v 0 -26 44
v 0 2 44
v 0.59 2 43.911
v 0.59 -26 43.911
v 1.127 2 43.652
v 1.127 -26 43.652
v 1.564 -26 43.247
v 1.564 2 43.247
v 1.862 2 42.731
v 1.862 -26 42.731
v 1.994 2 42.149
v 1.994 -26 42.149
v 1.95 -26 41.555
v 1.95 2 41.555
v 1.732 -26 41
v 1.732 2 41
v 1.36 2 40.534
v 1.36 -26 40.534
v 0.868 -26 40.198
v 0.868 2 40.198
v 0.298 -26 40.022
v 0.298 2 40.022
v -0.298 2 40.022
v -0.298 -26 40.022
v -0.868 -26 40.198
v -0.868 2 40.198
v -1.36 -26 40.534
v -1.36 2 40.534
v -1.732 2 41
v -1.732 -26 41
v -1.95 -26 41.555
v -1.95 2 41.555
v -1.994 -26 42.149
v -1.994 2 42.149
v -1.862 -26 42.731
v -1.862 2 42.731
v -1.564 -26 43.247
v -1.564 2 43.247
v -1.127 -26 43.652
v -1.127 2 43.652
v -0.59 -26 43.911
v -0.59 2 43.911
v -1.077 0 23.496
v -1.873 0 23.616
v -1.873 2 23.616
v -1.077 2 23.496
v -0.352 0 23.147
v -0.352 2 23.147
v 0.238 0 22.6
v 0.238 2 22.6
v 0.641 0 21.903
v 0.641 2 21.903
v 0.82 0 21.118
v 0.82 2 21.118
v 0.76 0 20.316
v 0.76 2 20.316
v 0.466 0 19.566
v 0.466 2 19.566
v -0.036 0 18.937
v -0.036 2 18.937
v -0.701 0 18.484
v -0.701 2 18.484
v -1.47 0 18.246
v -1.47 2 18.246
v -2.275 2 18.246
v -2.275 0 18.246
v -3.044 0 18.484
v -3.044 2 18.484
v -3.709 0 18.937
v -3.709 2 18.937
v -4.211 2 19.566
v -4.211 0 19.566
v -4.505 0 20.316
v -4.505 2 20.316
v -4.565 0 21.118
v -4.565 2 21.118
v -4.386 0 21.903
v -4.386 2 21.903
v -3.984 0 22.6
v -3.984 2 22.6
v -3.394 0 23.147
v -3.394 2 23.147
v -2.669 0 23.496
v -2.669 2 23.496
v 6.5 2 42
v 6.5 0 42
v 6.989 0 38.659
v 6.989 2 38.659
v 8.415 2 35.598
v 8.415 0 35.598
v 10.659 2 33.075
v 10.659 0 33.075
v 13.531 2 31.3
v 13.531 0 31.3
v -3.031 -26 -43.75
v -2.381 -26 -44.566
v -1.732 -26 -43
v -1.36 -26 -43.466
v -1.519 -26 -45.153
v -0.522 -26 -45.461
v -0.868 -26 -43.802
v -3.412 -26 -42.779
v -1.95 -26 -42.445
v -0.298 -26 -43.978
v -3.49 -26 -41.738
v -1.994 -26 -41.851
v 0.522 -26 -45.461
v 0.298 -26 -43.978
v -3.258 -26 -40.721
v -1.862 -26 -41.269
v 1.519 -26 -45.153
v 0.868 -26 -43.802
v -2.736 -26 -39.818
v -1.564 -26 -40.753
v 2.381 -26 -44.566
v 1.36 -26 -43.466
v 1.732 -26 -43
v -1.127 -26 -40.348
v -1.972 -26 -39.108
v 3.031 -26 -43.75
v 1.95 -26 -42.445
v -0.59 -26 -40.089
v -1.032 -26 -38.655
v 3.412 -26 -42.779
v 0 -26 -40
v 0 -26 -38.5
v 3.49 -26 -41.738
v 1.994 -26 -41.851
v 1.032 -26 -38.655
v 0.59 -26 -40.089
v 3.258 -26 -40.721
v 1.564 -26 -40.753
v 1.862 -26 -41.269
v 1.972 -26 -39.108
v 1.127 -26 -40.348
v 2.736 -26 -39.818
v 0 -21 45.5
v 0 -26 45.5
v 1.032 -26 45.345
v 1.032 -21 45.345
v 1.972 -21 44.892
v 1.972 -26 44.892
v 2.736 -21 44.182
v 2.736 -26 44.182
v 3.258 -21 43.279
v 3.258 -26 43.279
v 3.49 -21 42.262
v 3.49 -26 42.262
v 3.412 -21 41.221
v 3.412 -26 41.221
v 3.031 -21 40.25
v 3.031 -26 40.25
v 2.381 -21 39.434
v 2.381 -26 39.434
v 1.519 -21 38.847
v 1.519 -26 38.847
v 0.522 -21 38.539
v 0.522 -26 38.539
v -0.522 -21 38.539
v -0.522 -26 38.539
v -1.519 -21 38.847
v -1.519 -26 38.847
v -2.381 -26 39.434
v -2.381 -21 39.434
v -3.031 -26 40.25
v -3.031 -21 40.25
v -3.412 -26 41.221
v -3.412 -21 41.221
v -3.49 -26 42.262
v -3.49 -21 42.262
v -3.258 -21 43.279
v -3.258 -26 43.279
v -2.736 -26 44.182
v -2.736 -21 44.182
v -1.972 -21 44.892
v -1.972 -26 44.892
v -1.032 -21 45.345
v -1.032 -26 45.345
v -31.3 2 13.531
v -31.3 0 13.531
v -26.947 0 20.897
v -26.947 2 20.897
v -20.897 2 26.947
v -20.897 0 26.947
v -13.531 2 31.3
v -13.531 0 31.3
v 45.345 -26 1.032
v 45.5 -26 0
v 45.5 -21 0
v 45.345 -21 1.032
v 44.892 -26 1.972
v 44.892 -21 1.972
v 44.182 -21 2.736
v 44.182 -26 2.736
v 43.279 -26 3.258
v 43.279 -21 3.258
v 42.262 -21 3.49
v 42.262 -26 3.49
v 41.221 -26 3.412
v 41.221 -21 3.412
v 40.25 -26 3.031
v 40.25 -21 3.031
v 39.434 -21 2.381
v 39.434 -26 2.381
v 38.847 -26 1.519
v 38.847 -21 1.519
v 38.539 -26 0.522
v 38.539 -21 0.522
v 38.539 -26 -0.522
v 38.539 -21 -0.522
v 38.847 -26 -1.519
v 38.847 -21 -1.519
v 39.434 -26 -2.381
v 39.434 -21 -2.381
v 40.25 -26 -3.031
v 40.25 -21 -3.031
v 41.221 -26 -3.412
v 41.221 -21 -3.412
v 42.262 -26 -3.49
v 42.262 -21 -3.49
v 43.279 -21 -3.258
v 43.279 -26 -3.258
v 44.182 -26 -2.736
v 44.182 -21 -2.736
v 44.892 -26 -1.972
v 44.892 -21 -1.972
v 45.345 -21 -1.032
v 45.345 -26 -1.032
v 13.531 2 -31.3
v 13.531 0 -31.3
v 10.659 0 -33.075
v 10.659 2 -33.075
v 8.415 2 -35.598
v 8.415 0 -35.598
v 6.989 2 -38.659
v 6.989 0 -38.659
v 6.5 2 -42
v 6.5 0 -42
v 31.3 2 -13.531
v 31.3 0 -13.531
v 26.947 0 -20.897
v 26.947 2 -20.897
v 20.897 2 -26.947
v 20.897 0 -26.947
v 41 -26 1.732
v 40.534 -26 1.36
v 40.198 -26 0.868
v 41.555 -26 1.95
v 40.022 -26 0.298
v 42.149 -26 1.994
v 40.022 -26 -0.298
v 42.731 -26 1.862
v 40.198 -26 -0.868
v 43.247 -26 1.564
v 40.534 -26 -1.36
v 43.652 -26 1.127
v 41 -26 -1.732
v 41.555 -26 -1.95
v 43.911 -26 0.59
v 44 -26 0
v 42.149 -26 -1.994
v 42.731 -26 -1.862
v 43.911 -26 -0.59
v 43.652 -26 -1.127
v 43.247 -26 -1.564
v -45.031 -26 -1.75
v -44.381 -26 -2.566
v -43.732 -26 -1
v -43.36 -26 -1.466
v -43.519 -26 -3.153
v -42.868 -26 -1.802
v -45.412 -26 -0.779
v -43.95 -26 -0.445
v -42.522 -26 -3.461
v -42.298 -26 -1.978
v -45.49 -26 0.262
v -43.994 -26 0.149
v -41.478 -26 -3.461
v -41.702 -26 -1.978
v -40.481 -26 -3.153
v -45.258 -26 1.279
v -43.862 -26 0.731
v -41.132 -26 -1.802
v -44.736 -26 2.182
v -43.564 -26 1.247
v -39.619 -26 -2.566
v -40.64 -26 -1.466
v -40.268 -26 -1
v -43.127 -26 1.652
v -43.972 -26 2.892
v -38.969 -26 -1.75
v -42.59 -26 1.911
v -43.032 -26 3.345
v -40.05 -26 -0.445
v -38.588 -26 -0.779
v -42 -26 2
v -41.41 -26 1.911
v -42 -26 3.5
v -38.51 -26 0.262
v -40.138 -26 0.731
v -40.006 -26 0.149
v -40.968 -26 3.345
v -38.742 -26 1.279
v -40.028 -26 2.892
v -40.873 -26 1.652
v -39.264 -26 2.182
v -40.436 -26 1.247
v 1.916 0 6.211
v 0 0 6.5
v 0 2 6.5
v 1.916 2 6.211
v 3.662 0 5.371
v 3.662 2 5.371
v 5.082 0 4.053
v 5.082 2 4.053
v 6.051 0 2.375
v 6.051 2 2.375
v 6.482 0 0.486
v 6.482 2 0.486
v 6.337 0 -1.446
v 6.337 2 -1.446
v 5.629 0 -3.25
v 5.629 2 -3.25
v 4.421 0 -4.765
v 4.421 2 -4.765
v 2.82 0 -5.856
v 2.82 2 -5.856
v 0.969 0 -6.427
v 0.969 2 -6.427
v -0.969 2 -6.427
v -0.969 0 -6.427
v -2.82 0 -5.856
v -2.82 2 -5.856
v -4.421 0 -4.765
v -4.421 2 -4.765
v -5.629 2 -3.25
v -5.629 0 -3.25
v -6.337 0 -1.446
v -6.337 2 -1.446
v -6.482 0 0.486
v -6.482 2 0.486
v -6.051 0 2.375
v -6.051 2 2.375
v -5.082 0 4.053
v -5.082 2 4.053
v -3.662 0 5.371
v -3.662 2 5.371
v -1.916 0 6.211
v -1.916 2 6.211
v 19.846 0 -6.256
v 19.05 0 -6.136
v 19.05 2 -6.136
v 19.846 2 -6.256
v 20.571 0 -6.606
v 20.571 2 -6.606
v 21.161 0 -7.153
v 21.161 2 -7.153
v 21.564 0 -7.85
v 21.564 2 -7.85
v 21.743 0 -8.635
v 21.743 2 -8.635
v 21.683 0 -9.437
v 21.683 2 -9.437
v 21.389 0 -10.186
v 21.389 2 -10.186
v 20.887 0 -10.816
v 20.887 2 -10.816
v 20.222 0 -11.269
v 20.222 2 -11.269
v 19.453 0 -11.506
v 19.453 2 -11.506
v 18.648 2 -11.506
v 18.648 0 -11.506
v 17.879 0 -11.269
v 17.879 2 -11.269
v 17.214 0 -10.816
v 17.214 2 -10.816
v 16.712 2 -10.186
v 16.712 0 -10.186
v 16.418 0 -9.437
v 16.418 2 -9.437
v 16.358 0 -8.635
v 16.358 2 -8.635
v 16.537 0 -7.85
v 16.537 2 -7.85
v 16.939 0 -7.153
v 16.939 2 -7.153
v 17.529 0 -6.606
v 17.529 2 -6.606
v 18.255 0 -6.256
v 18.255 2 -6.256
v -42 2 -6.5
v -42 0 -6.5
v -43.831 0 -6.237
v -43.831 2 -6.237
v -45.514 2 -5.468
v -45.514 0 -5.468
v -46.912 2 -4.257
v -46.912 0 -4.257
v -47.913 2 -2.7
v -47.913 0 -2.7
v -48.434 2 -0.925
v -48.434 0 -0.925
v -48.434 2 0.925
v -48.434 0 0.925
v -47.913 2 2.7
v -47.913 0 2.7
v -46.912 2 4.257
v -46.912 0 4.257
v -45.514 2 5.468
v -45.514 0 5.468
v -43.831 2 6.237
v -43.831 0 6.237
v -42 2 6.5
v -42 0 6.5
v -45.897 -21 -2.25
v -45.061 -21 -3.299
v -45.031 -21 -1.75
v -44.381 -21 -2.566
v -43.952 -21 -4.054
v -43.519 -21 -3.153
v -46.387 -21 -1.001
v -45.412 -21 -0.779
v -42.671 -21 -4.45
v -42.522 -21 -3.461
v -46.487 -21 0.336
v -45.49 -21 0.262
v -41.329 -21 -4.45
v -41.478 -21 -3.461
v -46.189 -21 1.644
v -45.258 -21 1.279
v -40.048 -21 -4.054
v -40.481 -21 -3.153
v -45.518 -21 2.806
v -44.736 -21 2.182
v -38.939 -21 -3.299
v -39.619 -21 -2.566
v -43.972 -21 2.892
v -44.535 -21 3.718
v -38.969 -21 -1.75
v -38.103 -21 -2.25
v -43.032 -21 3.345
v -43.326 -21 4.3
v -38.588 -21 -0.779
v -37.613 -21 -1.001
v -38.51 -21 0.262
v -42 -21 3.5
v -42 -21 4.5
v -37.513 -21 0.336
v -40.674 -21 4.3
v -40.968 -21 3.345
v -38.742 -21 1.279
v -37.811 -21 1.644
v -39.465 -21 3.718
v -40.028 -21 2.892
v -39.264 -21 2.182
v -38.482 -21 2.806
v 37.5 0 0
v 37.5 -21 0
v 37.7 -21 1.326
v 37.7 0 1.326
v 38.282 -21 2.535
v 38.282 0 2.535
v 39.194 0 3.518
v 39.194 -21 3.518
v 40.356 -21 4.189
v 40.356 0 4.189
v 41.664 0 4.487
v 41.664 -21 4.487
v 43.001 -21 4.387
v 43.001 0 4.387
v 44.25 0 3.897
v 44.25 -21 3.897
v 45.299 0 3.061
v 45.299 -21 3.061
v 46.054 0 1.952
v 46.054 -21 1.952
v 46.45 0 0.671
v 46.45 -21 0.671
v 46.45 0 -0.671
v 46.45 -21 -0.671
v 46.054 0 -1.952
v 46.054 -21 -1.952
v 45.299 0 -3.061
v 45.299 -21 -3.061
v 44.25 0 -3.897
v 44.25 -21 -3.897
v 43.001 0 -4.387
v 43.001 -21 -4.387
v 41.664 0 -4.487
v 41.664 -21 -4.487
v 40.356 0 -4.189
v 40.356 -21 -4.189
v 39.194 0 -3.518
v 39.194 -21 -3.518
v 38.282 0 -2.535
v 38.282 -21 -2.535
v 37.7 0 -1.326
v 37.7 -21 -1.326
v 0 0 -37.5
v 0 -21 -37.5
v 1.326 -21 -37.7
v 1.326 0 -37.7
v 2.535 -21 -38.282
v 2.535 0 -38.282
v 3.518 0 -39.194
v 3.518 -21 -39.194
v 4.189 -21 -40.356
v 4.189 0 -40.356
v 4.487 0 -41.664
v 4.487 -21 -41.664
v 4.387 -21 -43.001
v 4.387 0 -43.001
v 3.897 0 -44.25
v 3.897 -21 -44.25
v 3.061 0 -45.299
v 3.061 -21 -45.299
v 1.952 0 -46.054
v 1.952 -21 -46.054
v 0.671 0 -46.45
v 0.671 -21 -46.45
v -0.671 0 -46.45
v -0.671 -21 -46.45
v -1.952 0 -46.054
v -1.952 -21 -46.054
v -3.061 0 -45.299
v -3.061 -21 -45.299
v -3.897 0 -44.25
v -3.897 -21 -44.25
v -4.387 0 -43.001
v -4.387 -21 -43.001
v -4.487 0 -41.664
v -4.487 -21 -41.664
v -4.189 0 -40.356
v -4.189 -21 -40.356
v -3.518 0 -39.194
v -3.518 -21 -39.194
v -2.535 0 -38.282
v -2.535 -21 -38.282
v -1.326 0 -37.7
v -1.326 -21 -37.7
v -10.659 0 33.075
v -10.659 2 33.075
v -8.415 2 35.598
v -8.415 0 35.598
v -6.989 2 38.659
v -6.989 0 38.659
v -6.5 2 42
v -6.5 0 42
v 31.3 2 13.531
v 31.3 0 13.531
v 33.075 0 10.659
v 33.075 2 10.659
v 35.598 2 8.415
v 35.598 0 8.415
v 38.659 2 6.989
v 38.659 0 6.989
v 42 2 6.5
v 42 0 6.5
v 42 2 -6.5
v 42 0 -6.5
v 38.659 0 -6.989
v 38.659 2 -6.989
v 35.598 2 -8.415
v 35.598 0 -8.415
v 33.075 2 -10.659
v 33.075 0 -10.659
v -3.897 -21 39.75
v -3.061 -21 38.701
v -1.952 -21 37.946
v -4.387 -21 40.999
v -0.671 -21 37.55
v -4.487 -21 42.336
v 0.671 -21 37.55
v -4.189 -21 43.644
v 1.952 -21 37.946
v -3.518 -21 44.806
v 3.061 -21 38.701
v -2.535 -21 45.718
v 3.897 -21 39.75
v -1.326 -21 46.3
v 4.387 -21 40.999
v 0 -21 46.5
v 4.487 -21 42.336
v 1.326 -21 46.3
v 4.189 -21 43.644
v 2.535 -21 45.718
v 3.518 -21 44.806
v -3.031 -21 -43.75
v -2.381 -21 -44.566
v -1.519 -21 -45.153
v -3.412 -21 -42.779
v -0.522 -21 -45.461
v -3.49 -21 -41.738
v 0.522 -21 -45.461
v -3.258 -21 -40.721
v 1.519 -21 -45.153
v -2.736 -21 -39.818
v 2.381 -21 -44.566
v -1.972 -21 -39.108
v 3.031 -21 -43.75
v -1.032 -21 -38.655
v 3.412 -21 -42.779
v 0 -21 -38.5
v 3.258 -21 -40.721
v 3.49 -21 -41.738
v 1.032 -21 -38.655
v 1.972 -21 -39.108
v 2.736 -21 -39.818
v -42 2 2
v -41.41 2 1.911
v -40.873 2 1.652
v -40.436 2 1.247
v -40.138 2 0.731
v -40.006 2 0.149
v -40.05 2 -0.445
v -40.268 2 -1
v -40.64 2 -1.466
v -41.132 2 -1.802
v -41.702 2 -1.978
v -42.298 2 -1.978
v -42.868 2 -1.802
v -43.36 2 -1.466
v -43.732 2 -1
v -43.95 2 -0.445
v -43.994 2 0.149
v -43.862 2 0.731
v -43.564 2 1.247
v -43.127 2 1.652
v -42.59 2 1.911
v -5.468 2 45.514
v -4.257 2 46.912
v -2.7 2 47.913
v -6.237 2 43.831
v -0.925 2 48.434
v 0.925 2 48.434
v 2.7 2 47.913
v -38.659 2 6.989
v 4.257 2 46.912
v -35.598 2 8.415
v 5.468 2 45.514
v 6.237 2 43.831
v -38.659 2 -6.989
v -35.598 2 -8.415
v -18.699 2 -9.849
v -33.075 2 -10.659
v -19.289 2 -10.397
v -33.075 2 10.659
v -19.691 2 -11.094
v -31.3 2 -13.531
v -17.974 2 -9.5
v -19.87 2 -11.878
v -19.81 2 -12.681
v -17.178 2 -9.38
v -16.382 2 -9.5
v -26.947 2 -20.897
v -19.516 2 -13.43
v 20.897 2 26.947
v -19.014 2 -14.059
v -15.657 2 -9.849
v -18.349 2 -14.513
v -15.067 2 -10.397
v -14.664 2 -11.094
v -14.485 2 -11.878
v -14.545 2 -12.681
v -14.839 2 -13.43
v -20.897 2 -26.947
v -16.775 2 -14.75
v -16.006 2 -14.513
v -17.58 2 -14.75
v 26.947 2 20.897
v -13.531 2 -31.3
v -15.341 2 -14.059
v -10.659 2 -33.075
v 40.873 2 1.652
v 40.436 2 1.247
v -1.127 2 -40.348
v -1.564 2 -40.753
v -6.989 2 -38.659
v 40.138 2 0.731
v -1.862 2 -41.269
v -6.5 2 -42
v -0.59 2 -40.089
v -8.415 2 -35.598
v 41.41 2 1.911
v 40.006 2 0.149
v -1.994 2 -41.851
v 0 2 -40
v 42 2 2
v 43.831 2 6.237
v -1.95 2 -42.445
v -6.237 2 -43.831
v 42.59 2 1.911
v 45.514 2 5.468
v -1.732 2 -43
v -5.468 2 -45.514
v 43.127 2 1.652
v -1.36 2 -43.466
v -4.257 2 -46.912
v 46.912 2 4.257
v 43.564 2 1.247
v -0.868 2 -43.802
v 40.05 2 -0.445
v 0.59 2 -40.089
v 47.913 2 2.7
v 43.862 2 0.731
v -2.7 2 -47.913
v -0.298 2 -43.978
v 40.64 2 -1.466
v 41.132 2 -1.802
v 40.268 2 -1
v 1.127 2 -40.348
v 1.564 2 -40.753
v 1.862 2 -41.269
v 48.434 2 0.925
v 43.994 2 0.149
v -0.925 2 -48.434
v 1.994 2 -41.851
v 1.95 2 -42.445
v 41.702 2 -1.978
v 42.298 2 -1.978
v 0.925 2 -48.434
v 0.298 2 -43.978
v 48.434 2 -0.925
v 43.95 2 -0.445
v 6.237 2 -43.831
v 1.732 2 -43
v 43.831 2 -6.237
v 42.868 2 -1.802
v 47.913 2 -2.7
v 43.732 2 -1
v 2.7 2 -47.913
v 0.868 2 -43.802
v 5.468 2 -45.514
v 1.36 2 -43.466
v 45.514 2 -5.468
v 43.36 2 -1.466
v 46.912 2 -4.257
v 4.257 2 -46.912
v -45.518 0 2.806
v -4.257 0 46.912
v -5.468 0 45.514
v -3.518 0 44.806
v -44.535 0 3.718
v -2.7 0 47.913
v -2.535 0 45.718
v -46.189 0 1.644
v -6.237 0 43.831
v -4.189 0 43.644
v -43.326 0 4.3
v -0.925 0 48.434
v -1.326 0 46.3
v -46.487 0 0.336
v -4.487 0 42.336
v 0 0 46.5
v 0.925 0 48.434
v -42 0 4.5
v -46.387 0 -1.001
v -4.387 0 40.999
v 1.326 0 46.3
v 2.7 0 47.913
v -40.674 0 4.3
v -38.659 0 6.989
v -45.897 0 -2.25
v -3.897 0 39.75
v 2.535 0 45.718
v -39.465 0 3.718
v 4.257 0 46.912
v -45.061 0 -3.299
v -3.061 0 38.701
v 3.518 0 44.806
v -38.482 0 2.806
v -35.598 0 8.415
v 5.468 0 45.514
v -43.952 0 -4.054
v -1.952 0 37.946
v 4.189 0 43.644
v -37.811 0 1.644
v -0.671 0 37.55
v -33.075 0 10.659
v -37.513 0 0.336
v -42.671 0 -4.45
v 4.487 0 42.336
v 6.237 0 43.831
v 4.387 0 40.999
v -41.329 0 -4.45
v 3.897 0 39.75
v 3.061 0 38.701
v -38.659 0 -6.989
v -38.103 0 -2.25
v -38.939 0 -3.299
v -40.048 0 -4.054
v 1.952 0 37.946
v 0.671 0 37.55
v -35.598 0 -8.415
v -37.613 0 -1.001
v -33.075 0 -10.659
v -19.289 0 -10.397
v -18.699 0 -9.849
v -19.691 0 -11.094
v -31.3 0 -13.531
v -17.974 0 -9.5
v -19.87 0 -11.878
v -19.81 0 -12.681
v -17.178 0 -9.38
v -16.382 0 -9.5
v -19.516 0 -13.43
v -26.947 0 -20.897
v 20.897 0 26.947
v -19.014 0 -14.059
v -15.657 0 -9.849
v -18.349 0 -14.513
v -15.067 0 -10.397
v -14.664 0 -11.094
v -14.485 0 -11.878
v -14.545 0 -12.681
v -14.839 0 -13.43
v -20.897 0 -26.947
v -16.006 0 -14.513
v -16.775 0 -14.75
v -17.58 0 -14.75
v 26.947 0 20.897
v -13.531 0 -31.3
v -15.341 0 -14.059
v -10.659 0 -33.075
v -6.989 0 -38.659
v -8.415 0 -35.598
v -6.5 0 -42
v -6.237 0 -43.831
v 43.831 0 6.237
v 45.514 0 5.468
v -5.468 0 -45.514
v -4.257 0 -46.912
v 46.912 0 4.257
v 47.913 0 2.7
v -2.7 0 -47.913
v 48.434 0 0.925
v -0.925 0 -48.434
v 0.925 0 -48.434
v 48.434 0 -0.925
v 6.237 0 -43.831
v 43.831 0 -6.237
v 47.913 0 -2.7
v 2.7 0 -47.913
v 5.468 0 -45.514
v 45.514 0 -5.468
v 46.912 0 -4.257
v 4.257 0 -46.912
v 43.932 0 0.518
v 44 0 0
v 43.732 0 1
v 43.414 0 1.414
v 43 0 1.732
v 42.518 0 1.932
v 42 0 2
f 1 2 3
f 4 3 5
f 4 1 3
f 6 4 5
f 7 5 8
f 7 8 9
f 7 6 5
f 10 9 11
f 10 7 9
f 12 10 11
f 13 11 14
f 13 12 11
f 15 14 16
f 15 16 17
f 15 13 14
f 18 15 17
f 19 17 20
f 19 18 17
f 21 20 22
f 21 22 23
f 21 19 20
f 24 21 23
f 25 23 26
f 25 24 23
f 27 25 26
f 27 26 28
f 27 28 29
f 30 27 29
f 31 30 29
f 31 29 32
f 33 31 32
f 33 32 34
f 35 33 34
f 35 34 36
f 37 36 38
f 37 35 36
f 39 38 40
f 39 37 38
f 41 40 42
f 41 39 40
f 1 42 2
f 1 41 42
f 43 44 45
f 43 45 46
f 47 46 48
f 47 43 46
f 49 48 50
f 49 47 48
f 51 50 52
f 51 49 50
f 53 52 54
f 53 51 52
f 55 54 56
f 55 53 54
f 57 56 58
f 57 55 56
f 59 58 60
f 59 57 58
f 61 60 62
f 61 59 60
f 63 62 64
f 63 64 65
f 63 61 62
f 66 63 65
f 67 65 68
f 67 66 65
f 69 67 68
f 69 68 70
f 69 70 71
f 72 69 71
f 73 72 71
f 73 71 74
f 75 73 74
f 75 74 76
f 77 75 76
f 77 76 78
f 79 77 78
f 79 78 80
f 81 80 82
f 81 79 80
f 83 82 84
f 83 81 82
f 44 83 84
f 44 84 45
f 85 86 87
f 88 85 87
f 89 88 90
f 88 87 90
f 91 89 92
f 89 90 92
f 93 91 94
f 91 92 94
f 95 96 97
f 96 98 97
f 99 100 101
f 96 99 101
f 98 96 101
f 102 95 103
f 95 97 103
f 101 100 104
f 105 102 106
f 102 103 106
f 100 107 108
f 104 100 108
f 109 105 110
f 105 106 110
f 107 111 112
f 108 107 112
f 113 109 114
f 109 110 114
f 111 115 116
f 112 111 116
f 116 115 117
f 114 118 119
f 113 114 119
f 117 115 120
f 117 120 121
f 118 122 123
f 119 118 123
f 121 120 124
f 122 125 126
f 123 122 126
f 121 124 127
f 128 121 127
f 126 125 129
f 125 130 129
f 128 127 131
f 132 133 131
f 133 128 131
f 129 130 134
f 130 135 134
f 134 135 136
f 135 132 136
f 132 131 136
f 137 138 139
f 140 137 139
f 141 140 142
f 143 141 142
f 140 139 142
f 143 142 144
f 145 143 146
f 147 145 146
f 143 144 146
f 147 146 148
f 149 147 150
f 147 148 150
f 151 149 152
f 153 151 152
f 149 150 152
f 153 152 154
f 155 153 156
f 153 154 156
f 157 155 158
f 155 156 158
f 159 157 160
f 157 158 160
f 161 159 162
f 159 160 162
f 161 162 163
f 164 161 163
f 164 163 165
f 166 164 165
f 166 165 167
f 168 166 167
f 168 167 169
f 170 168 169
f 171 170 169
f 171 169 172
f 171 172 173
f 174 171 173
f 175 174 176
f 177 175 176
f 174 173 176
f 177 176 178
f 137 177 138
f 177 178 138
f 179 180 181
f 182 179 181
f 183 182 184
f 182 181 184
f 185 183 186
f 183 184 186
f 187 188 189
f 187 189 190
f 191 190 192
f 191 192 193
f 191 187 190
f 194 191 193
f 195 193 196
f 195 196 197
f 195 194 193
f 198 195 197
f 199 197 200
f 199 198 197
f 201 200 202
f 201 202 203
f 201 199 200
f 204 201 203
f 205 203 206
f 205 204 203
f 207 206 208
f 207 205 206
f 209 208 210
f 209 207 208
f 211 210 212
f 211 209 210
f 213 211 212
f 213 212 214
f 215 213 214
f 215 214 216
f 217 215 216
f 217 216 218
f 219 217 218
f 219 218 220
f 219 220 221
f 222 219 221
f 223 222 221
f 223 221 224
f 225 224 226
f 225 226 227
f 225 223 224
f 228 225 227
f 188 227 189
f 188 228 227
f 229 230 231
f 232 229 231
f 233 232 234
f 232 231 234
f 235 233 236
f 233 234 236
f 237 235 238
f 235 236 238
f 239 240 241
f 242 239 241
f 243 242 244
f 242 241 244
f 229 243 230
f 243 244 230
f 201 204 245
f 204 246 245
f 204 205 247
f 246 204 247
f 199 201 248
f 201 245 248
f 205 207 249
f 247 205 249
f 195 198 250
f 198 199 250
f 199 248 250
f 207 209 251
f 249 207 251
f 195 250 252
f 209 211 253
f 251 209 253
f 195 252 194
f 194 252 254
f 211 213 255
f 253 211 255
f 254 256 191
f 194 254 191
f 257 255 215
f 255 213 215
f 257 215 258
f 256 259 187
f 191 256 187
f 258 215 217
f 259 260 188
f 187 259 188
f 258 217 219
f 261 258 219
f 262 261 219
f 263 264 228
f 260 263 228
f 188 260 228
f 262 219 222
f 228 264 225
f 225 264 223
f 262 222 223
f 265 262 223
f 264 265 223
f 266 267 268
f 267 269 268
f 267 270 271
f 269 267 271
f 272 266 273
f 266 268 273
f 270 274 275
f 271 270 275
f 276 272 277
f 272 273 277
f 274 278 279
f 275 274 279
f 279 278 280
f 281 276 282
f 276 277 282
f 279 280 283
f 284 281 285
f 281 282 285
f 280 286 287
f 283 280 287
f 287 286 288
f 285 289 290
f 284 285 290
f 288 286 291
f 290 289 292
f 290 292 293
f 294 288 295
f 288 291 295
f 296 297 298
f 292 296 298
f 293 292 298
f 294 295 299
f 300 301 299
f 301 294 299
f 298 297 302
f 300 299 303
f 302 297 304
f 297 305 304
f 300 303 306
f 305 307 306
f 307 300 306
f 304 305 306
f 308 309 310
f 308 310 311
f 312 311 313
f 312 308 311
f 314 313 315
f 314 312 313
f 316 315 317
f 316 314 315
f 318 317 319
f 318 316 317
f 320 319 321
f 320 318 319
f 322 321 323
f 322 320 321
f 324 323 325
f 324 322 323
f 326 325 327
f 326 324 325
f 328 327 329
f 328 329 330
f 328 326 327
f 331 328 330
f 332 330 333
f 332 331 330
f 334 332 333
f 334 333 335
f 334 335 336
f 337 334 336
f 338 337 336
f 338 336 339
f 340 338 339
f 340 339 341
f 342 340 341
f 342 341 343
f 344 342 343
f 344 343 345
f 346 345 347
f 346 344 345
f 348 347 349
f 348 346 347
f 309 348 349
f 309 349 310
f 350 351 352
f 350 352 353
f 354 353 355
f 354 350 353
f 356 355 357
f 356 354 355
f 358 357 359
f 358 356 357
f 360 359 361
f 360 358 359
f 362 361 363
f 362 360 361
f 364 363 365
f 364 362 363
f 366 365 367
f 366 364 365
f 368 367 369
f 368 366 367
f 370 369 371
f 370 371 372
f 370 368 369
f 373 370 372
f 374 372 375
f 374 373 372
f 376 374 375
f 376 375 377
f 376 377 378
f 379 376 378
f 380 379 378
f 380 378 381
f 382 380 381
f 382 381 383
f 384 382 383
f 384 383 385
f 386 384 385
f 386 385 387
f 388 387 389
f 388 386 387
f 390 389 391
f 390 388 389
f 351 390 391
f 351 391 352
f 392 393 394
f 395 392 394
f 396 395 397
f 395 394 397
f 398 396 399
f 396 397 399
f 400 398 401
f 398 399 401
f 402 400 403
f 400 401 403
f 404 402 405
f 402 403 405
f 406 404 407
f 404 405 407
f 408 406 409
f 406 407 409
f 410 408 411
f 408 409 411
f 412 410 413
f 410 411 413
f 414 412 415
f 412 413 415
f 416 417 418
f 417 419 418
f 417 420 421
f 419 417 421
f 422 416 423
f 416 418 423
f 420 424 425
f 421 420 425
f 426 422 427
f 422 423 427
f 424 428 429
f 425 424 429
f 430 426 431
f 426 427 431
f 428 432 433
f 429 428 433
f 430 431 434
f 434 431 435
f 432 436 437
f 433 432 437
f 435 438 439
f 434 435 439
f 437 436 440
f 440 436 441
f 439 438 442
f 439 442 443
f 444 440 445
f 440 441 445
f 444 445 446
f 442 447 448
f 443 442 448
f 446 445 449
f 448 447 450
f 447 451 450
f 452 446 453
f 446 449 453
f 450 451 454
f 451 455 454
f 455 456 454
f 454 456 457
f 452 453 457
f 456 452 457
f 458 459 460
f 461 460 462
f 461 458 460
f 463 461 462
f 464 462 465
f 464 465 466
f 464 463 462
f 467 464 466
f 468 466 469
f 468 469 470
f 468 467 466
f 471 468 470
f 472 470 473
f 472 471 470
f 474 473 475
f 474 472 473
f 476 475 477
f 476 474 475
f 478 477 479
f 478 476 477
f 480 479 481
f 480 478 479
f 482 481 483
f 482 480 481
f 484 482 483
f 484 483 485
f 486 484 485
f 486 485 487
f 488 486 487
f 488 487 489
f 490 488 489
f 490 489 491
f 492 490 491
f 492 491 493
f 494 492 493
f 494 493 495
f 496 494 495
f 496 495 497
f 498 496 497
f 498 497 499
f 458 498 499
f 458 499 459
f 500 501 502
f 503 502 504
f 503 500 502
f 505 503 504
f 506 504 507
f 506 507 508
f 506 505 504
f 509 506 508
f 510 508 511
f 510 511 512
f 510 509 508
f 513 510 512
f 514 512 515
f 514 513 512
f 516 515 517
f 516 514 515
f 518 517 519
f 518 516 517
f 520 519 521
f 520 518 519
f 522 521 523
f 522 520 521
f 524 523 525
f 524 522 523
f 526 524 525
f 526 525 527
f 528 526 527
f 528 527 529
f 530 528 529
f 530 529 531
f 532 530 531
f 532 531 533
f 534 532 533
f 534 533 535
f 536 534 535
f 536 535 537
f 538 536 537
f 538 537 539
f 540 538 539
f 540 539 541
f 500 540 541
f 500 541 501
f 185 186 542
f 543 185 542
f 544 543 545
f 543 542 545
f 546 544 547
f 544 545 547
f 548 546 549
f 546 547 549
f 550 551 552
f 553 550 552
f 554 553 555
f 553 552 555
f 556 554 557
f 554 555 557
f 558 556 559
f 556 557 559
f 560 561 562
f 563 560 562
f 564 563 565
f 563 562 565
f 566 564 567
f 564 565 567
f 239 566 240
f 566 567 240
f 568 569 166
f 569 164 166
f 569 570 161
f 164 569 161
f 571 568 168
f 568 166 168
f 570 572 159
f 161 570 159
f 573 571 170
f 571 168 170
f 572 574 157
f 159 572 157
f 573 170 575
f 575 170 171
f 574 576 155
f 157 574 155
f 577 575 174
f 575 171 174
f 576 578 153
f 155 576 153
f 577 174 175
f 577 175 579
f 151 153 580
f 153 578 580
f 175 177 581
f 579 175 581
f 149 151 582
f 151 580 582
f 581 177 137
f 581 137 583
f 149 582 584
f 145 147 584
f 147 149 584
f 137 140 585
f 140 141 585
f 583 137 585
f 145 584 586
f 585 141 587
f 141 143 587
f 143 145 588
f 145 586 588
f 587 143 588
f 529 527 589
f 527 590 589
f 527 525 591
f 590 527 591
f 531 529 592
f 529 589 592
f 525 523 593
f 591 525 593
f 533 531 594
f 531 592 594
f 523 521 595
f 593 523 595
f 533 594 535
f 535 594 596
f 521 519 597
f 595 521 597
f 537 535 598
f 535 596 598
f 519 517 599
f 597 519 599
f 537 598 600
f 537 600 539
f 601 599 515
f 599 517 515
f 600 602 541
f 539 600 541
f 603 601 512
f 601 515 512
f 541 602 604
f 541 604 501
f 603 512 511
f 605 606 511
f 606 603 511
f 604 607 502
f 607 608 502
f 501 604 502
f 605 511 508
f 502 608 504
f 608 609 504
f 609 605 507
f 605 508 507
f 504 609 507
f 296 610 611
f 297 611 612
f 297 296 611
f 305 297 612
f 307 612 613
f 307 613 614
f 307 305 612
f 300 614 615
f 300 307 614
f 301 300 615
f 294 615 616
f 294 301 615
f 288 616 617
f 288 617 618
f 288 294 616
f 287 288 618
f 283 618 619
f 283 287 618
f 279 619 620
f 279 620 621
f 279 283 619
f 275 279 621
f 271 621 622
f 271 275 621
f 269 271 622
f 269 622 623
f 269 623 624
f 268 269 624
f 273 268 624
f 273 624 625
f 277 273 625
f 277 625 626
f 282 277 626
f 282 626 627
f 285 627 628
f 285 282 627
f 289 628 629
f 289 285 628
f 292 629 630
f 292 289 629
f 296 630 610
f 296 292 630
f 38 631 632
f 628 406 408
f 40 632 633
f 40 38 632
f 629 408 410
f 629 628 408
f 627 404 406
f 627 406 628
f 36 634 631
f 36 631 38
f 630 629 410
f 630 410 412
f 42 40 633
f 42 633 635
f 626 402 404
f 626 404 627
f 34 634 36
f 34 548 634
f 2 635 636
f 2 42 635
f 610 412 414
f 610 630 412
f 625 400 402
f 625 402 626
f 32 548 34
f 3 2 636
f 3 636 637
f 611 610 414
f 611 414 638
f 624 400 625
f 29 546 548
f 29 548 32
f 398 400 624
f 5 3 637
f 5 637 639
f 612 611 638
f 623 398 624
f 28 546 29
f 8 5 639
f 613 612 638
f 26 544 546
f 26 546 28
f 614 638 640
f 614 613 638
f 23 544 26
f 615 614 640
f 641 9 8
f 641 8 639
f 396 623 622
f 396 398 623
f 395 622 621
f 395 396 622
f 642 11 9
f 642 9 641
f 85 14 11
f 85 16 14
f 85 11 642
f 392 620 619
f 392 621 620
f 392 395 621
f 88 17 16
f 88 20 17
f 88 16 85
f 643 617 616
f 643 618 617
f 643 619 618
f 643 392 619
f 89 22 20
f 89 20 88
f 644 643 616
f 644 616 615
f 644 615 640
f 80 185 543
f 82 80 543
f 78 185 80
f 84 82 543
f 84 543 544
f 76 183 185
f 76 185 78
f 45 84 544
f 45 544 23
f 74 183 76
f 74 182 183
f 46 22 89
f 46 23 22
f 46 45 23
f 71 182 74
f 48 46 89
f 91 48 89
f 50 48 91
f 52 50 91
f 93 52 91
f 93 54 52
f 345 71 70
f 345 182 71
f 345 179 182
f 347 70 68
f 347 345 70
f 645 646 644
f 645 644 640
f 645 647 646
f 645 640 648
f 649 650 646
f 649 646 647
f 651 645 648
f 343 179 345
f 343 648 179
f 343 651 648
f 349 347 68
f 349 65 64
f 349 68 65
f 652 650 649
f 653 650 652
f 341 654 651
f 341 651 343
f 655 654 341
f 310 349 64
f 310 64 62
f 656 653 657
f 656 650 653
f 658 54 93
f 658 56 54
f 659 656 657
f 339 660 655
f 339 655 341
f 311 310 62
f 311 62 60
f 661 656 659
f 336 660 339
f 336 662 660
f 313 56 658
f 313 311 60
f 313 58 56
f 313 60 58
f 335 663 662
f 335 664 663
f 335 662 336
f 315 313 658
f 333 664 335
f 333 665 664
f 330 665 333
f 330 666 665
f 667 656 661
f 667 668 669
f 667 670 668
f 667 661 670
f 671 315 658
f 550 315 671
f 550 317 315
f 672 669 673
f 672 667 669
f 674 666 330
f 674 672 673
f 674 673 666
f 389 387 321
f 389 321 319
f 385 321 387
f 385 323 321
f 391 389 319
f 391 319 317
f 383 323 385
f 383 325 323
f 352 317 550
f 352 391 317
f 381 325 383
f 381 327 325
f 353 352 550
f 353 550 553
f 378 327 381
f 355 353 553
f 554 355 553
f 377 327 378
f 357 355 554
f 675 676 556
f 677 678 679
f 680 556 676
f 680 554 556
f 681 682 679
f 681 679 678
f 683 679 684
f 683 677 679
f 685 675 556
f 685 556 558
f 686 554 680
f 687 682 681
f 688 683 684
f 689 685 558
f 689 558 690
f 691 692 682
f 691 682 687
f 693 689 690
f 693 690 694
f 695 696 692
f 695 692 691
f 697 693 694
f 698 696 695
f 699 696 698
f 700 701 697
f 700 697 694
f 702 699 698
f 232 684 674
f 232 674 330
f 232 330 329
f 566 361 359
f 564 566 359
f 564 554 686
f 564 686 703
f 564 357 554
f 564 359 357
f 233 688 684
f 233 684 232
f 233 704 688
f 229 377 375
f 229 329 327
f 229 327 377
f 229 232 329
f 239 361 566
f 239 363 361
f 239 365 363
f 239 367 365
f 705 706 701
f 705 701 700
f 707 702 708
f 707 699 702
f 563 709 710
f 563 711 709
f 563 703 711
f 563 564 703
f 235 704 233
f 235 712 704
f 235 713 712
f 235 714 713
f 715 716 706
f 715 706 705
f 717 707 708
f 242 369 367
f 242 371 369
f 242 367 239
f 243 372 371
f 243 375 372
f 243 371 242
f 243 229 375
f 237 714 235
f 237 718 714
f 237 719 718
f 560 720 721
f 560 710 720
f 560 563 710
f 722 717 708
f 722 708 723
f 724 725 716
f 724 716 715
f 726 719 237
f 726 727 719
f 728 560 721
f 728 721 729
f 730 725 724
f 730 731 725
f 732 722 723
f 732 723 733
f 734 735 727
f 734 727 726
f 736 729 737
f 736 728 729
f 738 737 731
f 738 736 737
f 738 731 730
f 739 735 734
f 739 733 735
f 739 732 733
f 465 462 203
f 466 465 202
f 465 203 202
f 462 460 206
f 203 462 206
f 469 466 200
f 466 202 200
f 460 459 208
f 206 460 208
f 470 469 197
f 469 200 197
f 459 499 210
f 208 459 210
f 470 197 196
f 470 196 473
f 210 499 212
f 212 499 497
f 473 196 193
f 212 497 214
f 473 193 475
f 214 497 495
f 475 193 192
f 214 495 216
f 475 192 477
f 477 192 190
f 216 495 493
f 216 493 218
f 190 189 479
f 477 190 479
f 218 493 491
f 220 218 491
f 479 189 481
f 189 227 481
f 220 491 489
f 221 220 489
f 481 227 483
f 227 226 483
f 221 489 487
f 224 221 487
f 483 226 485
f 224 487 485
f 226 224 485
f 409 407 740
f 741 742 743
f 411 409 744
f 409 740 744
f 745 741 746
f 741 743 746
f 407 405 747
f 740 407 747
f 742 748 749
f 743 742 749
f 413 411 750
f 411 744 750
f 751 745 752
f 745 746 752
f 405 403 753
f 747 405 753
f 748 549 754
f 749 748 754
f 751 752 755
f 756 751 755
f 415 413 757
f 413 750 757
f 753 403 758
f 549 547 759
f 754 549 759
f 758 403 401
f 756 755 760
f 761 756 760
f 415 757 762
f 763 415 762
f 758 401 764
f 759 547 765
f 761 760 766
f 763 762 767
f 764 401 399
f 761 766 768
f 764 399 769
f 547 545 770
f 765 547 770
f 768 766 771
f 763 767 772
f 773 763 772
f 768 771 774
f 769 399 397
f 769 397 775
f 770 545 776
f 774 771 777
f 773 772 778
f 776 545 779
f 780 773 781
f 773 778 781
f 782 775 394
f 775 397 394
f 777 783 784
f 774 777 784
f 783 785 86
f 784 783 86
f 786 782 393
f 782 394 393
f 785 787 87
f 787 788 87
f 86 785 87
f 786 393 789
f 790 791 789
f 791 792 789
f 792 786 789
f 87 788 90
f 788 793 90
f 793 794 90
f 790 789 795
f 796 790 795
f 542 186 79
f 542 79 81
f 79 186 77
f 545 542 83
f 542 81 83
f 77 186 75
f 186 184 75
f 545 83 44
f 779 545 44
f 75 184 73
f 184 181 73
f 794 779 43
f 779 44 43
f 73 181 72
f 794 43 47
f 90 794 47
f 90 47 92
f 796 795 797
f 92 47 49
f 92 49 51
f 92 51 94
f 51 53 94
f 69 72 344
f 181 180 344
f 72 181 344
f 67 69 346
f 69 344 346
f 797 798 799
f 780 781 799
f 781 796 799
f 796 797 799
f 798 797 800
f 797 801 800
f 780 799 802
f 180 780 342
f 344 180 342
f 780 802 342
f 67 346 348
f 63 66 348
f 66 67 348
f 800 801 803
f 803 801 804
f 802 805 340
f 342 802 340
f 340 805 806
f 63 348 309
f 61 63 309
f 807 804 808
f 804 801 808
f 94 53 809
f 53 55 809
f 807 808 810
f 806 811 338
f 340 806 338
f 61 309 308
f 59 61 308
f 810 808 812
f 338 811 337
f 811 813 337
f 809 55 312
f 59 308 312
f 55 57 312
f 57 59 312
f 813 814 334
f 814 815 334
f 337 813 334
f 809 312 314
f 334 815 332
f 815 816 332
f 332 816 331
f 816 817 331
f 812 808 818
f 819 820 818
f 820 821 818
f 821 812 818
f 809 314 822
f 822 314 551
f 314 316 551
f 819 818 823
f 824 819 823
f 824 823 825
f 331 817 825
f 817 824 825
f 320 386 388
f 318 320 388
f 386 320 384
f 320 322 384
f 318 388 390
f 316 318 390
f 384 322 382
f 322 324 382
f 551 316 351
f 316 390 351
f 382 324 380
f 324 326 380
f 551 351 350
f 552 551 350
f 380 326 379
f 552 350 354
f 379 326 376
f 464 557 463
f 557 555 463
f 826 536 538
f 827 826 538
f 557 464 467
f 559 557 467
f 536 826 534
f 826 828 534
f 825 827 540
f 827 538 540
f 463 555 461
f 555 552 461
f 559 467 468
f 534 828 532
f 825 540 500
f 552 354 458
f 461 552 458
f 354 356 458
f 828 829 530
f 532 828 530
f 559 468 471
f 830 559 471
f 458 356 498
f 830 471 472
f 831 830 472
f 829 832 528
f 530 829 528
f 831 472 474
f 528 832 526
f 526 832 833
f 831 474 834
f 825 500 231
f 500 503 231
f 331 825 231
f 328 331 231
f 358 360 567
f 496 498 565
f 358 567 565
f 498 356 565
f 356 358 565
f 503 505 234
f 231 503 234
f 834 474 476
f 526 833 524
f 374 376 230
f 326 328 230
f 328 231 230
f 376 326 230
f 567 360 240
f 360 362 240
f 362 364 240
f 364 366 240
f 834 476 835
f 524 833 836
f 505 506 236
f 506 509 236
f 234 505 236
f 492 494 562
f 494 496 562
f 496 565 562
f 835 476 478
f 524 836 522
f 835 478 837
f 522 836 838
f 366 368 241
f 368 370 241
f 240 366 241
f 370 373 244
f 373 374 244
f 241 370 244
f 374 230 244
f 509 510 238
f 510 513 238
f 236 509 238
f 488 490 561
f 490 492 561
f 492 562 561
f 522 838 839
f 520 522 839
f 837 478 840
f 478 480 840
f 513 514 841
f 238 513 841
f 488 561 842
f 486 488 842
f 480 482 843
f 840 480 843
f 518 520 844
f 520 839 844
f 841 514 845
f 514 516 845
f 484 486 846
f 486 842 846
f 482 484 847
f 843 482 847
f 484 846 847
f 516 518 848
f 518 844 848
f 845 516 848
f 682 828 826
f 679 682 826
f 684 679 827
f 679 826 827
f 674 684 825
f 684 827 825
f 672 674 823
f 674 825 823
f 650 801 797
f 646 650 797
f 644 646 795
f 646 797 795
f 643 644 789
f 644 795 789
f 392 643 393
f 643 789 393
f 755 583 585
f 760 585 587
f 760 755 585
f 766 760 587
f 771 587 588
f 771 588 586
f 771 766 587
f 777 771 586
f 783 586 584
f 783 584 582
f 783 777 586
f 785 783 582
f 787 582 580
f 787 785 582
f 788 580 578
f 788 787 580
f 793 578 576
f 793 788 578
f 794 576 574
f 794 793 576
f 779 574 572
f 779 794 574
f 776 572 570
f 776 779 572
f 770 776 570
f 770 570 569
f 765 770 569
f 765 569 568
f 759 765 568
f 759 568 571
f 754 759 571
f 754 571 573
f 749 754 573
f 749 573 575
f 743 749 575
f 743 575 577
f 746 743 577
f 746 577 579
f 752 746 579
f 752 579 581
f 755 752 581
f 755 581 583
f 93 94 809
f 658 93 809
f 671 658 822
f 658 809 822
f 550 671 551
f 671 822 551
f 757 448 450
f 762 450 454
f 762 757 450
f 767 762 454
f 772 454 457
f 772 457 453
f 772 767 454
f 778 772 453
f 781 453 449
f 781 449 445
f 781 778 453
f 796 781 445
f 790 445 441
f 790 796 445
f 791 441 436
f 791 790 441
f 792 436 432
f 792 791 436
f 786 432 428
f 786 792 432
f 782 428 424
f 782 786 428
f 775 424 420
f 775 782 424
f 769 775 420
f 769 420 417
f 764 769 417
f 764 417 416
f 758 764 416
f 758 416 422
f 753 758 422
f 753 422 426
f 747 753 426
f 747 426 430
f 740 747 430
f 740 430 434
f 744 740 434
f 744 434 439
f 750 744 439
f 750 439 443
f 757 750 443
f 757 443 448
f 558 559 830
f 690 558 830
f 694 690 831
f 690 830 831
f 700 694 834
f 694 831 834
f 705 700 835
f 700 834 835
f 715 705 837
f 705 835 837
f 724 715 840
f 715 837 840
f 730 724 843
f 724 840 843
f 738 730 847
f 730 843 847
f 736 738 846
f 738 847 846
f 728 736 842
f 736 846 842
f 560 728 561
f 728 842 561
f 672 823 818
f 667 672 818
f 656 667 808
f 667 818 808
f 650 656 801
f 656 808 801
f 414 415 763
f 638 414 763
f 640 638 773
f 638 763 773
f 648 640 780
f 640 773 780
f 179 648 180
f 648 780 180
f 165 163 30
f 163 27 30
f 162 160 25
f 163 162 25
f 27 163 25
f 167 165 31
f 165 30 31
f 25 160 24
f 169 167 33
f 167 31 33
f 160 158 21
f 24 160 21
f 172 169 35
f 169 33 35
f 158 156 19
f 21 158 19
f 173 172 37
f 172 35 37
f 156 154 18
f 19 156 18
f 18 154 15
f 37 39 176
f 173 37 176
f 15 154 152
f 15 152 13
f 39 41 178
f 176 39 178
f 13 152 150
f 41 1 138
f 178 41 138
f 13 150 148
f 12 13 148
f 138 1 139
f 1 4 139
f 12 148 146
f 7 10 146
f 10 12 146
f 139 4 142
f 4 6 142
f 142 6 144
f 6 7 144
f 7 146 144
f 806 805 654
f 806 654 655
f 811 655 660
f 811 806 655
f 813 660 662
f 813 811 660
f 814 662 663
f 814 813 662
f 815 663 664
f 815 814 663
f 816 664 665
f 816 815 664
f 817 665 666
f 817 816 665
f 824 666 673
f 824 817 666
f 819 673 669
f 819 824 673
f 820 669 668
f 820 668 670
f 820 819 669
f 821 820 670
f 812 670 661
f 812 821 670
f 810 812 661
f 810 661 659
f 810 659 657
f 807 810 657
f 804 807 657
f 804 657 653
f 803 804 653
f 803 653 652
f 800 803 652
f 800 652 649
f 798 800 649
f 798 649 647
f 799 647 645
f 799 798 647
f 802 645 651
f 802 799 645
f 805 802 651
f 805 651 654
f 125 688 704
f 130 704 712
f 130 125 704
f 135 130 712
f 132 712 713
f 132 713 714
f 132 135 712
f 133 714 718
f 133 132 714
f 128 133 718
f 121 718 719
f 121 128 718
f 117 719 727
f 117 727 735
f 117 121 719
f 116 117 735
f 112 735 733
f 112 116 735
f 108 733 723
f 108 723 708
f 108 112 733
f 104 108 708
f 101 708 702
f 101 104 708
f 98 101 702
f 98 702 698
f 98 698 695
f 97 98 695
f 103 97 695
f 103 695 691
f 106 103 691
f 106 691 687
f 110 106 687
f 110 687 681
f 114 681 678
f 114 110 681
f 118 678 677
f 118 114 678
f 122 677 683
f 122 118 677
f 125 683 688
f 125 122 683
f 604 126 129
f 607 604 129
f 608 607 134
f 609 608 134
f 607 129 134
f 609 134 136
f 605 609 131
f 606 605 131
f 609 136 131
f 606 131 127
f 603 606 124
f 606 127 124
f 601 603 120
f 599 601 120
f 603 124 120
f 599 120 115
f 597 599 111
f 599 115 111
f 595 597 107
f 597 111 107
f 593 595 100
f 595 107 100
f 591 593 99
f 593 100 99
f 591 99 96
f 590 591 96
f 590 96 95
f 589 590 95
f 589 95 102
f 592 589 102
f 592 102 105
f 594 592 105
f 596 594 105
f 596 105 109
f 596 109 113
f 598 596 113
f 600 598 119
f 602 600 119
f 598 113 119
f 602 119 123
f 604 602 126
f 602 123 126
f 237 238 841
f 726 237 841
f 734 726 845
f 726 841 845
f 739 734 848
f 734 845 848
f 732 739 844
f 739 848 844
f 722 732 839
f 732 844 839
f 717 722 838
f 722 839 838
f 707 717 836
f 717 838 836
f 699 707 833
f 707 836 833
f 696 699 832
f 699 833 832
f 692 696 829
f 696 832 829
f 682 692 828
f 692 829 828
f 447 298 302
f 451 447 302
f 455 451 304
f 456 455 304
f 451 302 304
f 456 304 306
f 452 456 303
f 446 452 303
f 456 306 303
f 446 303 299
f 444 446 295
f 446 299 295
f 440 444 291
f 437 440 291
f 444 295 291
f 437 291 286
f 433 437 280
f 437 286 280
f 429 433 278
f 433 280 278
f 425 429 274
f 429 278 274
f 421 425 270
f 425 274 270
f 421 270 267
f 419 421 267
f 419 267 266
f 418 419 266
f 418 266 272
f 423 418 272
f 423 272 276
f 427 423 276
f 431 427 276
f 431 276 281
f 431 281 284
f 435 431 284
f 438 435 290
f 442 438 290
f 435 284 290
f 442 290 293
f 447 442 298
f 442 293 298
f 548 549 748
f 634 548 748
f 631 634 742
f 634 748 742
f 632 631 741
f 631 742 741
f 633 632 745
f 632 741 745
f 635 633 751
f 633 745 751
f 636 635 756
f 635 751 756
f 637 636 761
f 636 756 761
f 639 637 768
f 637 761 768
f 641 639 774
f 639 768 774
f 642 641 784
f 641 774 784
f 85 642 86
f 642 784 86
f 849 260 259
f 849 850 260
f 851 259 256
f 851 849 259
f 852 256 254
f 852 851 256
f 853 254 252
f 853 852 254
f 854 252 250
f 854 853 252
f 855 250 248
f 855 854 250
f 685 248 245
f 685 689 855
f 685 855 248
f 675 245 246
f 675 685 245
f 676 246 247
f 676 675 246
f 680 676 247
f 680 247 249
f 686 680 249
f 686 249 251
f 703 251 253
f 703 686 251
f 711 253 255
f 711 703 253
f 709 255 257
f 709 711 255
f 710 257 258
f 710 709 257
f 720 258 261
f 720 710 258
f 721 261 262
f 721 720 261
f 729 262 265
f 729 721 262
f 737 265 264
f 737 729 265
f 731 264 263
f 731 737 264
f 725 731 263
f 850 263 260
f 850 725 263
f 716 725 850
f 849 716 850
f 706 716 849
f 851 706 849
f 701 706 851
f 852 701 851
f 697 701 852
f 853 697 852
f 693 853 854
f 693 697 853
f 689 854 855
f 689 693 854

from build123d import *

# Parameters (mm, degrees)
SKETCH1_R           = 2
SKETCH1_R_2         = 2.7
SKETCH1_R_3         = 6.5
BOSS_EXTRUDE1_DEPTH = 2
SKETCH1_3_R         = 4.5
SKETCH1_3_R_2       = 3.5
SKETCH1_3_R_3       = 2
BOSS_EXTRUDE2_DEPTH = 26
CUT_EXTRUDE1_START  = -26
SKETCH1_4_R         = 4.5
SKETCH1_4_R_2       = 3.5
CUT_EXTRUDE1_DEPTH  = 5


with BuildPart() as part:
    # Sketch1 → Boss-Extrude1 (new body)
    with BuildSketch(Plane(origin=(0, 0, 0), x_dir=(1, 0, 0), z_dir=(0, 1, 0))):
        with BuildLine():
            ThreePointArc((31.3004561, 13.531128848), (24.112341238, 24.112341238), (13.531128848, 31.3004561))
            ThreePointArc((13.531128848, 31.3004561), (8.415102647, 35.598496025), (6.5, 42))
            ThreePointArc((6.5, 42), (0, 48.5), (-6.5, 42))
            ThreePointArc((-6.5, 42), (-8.415102647, 35.598496025), (-13.531128848, 31.3004561))
            ThreePointArc((-13.531128848, 31.3004561), (-24.112341238, 24.112341238), (-31.3004561, 13.531128848))
            ThreePointArc((-31.3004561, 13.531128848), (-35.598496025, 8.415102647), (-42, 6.5))
            ThreePointArc((-42, 6.5), (-48.5, 0), (-42, -6.5))
            ThreePointArc((-42, -6.5), (-35.598496025, -8.415102647), (-31.3004561, -13.531128848))
            ThreePointArc((-31.3004561, -13.531128848), (-24.112341238, -24.112341238), (-13.531128848, -31.3004561))
            ThreePointArc((-13.531128848, -31.3004561), (-8.415102647, -35.598496025), (-6.5, -42))
            ThreePointArc((-6.5, -42), (0, -48.5), (6.5, -42))
            ThreePointArc((6.5, -42), (8.415102647, -35.598496025), (13.531128848, -31.3004561))
            ThreePointArc((13.531128848, -31.3004561), (24.112341238, -24.112341238), (31.3004561, -13.531128848))
            ThreePointArc((31.3004561, -13.531128848), (35.598496025, -8.415102647), (42, -6.5))
            ThreePointArc((42, -6.5), (48.5, 0), (42, 6.5))
            ThreePointArc((42, 6.5), (35.598496025, 8.415102647), (31.3004561, 13.531128848))
        make_face()
        with Locations(Location((-42, 0, 0), (0, 0, 270))):
            Circle(SKETCH1_R, mode=Mode.SUBTRACT)
        with Locations(Location((-1.872696433, -20.916333524, 0), (0, 0, 270))):
            Circle(SKETCH1_R_2, mode=Mode.SUBTRACT)
        with Locations(Location((0, -42, 0), (0, 0, 270))):
            Circle(SKETCH1_R, mode=Mode.SUBTRACT)
        with Locations(Location((0, 0, 0), (0, 0, 270))):
            Circle(SKETCH1_R_3, mode=Mode.SUBTRACT)
        with Locations(Location((42, 0, 0), (0, 0, 270))):
            Circle(SKETCH1_R, mode=Mode.SUBTRACT)
        with Locations(Location((-17.177727969, 12.079969447, 0), (0, 0, 270))):
            Circle(SKETCH1_R_2, mode=Mode.SUBTRACT)
        with Locations(Location((19.050424402, 8.836364077, 0), (0, 0, 270))):
            Circle(SKETCH1_R_2, mode=Mode.SUBTRACT)
        with Locations(Location((0, 42, 0), (0, 0, 270))):
            Circle(SKETCH1_R, mode=Mode.SUBTRACT)
    extrude(amount=BOSS_EXTRUDE1_DEPTH)

    # Sketch1<3> → Boss-Extrude2 (add)
    with BuildSketch(Plane(origin=(0, 0, 0), x_dir=(1, 0, 0), z_dir=(0, 1, 0))):
        with BuildLine():
            ThreePointArc((46.5, 0), (42, 4.5), (37.5, 0))
            Line((37.5, 0), (38.5, 0))
            ThreePointArc((38.5, 0), (42, 3.5), (45.5, 0))
            Line((45.5, 0), (46.5, 0))
        make_face()
        with BuildLine():
            Line((38.5, 0), (37.5, 0))
            ThreePointArc((37.5, 0), (42, -4.5), (46.5, 0))
            Line((46.5, 0), (45.5, 0))
            ThreePointArc((45.5, 0), (42, -3.5), (38.5, 0))
        make_face()
        with BuildLine():
            ThreePointArc((45.5, 0), (42, 3.5), (38.5, 0))
            Line((38.5, 0), (40, 0))
            ThreePointArc((40, 0), (42, 2), (44, 0))
            Line((44, 0), (45.5, 0))
        make_face()
        with BuildLine():
            Line((40, 0), (38.5, 0))
            ThreePointArc((38.5, 0), (42, -3.5), (45.5, 0))
            Line((45.5, 0), (44, 0))
            ThreePointArc((44, 0), (42, -2), (40, 0))
        make_face()
        with Locations(Location((0, -42, 0), (0, 0, 270))):
            Circle(SKETCH1_3_R)
        with Locations((0, -42)):
            Circle(SKETCH1_3_R_2, mode=Mode.SUBTRACT)
        with Locations((0, -42)):
            Circle(SKETCH1_3_R_2)
        with Locations(Location((0, -42, 0), (0, 0, 270))):
            Circle(SKETCH1_3_R_3, mode=Mode.SUBTRACT)
        with Locations(Location((-42, 0, 0), (0, 0, 270))):
            Circle(SKETCH1_3_R)
        with Locations((-42, 0)):
            Circle(SKETCH1_3_R_2, mode=Mode.SUBTRACT)
        with Locations((-42, 0)):
            Circle(SKETCH1_3_R_2)
        with Locations(Location((-42, 0, 0), (0, 0, 270))):
            Circle(SKETCH1_3_R_3, mode=Mode.SUBTRACT)
        with Locations(Location((0, 42, 0), (0, 0, 270))):
            Circle(SKETCH1_3_R)
        with Locations((0, 42)):
            Circle(SKETCH1_3_R_2, mode=Mode.SUBTRACT)
        with Locations((0, 42)):
            Circle(SKETCH1_3_R_2)
        with Locations(Location((0, 42, 0), (0, 0, 270))):
            Circle(SKETCH1_3_R_3, mode=Mode.SUBTRACT)
    extrude(amount=-BOSS_EXTRUDE2_DEPTH)

    # Sketch1<4> → Cut-Extrude1 (cut)
    with BuildSketch(Plane(origin=(0, 0, 0), x_dir=(1, 0, 0), z_dir=(0, 1, 0)).offset(CUT_EXTRUDE1_START)):
        with Locations(Location((0, -42, 0), (0, 0, 270))):
            Circle(SKETCH1_4_R)
        with Locations(Location((0, -42, 0), (0, 0, 270))):
            Circle(SKETCH1_4_R_2, mode=Mode.SUBTRACT)
        with BuildLine():
            ThreePointArc((46.5, 0), (42, 4.5), (37.5, 0))
            Line((37.5, 0), (38.5, 0))
            ThreePointArc((38.5, 0), (42, 3.5), (45.5, 0))
            Line((45.5, 0), (46.5, 0))
        make_face()
        with BuildLine():
            Line((38.5, 0), (37.5, 0))
            ThreePointArc((37.5, 0), (42, -4.5), (46.5, 0))
            Line((46.5, 0), (45.5, 0))
            ThreePointArc((45.5, 0), (42, -3.5), (38.5, 0))
        make_face()
        with Locations(Location((0, 42, 0), (0, 0, 270))):
            Circle(SKETCH1_4_R)
        with Locations(Location((0, 42, 0), (0, 0, 270))):
            Circle(SKETCH1_4_R_2, mode=Mode.SUBTRACT)
        with Locations(Location((-42, 0, 0), (0, 0, 270))):
            Circle(SKETCH1_4_R)
        with Locations(Location((-42, 0, 0), (0, 0, 270))):
            Circle(SKETCH1_4_R_2, mode=Mode.SUBTRACT)
    extrude(amount=CUT_EXTRUDE1_DEPTH, mode=Mode.SUBTRACT)


solid = part.part
